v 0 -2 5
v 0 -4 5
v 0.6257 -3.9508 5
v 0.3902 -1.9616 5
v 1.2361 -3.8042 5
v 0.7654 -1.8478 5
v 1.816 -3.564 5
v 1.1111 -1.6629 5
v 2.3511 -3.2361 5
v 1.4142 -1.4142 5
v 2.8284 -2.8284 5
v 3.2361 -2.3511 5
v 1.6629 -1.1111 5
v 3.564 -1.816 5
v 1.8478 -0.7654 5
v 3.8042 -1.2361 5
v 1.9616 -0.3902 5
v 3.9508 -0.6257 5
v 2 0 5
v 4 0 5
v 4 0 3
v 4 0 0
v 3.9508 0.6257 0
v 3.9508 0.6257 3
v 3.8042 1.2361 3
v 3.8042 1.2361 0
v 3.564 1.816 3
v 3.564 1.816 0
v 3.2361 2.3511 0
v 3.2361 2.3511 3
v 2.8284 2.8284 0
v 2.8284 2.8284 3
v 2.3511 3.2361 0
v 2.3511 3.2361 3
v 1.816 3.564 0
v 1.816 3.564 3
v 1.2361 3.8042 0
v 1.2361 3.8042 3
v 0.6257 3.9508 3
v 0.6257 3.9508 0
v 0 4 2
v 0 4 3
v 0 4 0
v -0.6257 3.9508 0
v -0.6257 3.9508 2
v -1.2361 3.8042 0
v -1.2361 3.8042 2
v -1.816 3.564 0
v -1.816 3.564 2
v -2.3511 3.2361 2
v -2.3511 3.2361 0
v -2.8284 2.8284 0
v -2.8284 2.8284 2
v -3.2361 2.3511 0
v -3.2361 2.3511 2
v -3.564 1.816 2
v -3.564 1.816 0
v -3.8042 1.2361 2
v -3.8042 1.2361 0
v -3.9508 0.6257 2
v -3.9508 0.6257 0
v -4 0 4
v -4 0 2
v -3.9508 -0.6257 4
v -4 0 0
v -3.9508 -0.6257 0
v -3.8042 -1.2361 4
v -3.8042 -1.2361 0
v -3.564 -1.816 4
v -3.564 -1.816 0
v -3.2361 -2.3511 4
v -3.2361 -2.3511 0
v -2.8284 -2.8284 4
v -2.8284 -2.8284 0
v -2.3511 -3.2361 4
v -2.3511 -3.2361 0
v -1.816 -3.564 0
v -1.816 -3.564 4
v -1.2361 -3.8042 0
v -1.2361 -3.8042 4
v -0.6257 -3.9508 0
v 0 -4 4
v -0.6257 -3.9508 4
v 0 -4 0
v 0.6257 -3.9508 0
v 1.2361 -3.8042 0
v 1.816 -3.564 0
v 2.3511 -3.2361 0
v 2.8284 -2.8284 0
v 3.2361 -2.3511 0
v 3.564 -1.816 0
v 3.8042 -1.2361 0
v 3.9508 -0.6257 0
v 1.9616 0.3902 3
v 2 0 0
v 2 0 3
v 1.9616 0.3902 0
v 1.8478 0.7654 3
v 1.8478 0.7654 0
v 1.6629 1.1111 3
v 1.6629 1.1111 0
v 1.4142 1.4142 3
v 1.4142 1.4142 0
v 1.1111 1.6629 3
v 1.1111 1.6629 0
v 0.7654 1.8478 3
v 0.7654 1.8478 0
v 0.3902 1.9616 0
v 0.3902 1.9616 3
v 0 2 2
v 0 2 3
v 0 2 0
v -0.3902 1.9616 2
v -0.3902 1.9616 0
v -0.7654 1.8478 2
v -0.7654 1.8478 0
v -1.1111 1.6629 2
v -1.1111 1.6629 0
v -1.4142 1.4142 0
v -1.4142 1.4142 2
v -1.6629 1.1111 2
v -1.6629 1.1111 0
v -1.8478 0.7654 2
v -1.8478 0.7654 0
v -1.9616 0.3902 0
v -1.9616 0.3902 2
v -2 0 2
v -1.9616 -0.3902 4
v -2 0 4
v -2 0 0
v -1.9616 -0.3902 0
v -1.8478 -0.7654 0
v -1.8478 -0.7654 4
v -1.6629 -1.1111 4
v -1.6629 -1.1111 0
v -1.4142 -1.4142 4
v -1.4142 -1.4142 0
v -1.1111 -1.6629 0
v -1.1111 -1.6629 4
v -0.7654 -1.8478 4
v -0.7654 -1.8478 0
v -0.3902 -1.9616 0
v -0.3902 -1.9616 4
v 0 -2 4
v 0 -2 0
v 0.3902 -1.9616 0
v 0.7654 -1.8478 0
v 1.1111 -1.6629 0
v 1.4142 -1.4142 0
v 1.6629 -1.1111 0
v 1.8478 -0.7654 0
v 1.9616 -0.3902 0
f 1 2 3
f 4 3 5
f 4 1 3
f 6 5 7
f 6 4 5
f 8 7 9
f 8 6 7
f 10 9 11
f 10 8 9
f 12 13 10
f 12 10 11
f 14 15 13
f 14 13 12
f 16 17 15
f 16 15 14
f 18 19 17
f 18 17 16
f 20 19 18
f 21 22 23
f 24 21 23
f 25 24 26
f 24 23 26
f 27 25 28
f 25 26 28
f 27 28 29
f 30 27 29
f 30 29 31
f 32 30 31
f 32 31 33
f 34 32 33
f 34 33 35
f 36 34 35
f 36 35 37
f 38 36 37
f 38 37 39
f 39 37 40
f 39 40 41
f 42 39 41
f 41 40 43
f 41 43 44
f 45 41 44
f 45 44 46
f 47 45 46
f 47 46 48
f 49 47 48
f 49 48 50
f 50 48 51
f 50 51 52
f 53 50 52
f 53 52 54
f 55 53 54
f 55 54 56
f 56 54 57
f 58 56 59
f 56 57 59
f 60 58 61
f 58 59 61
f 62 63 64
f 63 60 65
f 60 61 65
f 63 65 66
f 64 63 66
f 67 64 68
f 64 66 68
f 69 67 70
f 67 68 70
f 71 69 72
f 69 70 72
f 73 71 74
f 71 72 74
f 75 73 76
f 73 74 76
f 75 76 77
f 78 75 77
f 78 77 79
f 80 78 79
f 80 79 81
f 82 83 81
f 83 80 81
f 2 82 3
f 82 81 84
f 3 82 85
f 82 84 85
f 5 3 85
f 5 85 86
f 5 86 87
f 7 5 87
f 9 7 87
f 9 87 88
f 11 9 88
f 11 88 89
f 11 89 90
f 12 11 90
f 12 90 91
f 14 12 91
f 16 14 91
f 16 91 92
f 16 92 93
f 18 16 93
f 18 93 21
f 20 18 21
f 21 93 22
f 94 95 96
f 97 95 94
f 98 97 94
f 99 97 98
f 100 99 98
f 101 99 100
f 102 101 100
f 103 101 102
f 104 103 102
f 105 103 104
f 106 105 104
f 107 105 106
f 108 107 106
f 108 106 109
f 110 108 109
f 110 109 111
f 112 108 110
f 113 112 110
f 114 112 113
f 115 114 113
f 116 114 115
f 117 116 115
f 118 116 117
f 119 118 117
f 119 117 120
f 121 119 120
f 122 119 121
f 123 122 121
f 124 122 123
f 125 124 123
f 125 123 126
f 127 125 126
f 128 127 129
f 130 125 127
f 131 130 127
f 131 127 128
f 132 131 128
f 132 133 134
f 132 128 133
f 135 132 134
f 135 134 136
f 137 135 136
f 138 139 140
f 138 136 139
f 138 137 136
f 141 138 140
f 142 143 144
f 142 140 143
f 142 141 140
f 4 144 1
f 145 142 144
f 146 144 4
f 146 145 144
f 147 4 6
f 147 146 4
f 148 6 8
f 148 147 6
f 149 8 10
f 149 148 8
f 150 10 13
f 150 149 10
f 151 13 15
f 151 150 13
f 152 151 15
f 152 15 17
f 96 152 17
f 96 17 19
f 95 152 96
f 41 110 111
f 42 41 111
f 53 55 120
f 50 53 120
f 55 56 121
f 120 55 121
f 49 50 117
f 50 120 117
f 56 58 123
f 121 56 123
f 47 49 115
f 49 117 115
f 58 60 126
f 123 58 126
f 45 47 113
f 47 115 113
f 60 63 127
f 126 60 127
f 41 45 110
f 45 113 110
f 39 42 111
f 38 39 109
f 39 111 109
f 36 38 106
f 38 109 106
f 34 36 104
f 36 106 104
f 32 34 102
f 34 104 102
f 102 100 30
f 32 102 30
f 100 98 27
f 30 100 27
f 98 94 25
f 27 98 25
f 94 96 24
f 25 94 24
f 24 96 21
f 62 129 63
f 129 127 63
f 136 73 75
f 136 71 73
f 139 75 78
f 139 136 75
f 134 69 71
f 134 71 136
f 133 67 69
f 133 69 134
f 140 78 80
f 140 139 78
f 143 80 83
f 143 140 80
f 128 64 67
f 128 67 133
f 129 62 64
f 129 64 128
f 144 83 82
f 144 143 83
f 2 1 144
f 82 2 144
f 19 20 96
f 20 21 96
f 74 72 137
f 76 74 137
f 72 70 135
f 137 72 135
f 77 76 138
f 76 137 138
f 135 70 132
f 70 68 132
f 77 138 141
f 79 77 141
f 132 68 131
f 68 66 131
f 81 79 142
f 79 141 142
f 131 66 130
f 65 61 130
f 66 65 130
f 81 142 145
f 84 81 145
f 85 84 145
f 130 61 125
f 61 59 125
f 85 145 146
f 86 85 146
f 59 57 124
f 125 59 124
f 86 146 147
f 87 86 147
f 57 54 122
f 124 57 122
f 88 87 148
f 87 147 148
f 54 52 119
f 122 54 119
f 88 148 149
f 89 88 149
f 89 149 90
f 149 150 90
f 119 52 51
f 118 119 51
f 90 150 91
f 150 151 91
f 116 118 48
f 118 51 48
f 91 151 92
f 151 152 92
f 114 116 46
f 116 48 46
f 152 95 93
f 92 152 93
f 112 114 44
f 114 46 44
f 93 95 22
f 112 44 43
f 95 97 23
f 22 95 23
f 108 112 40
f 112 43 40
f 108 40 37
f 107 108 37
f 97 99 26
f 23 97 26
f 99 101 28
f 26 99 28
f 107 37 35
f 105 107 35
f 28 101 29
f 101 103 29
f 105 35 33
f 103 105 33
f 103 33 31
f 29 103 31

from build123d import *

# Parameters (mm, degrees)
SKETCH1_R           = 4
SKETCH1_R_2         = 2
BOSS_EXTRUDE1_DEPTH = 5
CUT_EXTRUDE1_DEPTH  = 5
SKETCH3_W           = 4
SKETCH3_H           = 1
CUT_EXTRUDE2_DEPTH  = 5


with BuildPart() as part:
    # Sketch1 → Boss-Extrude1 (new body)
    with BuildSketch(Plane.XY):
        Circle(SKETCH1_R)
        Circle(SKETCH1_R_2, mode=Mode.SUBTRACT)
    extrude(amount=BOSS_EXTRUDE1_DEPTH)

    # Sketch2 → Cut-Extrude1 (cut)
    with BuildSketch(Plane(origin=(0, 0, 0), x_dir=(1, 0, 0), z_dir=(0, 1, 0))):
        Polygon((-4, -2), (0, -2), (0, -3), (4, -3), (4, -5), (-4, -5), align=None)
    extrude(amount=CUT_EXTRUDE1_DEPTH, mode=Mode.SUBTRACT)

    # Sketch3 → Cut-Extrude2 (cut)
    with BuildSketch(Plane(origin=(0, 0, 0), x_dir=(1, 0, 0), z_dir=(0, 1, 0))):
        with Locations((-2, -4.5)):
            Rectangle(SKETCH3_W, SKETCH3_H)
    extrude(amount=-CUT_EXTRUDE2_DEPTH, mode=Mode.SUBTRACT)


solid = part.part
